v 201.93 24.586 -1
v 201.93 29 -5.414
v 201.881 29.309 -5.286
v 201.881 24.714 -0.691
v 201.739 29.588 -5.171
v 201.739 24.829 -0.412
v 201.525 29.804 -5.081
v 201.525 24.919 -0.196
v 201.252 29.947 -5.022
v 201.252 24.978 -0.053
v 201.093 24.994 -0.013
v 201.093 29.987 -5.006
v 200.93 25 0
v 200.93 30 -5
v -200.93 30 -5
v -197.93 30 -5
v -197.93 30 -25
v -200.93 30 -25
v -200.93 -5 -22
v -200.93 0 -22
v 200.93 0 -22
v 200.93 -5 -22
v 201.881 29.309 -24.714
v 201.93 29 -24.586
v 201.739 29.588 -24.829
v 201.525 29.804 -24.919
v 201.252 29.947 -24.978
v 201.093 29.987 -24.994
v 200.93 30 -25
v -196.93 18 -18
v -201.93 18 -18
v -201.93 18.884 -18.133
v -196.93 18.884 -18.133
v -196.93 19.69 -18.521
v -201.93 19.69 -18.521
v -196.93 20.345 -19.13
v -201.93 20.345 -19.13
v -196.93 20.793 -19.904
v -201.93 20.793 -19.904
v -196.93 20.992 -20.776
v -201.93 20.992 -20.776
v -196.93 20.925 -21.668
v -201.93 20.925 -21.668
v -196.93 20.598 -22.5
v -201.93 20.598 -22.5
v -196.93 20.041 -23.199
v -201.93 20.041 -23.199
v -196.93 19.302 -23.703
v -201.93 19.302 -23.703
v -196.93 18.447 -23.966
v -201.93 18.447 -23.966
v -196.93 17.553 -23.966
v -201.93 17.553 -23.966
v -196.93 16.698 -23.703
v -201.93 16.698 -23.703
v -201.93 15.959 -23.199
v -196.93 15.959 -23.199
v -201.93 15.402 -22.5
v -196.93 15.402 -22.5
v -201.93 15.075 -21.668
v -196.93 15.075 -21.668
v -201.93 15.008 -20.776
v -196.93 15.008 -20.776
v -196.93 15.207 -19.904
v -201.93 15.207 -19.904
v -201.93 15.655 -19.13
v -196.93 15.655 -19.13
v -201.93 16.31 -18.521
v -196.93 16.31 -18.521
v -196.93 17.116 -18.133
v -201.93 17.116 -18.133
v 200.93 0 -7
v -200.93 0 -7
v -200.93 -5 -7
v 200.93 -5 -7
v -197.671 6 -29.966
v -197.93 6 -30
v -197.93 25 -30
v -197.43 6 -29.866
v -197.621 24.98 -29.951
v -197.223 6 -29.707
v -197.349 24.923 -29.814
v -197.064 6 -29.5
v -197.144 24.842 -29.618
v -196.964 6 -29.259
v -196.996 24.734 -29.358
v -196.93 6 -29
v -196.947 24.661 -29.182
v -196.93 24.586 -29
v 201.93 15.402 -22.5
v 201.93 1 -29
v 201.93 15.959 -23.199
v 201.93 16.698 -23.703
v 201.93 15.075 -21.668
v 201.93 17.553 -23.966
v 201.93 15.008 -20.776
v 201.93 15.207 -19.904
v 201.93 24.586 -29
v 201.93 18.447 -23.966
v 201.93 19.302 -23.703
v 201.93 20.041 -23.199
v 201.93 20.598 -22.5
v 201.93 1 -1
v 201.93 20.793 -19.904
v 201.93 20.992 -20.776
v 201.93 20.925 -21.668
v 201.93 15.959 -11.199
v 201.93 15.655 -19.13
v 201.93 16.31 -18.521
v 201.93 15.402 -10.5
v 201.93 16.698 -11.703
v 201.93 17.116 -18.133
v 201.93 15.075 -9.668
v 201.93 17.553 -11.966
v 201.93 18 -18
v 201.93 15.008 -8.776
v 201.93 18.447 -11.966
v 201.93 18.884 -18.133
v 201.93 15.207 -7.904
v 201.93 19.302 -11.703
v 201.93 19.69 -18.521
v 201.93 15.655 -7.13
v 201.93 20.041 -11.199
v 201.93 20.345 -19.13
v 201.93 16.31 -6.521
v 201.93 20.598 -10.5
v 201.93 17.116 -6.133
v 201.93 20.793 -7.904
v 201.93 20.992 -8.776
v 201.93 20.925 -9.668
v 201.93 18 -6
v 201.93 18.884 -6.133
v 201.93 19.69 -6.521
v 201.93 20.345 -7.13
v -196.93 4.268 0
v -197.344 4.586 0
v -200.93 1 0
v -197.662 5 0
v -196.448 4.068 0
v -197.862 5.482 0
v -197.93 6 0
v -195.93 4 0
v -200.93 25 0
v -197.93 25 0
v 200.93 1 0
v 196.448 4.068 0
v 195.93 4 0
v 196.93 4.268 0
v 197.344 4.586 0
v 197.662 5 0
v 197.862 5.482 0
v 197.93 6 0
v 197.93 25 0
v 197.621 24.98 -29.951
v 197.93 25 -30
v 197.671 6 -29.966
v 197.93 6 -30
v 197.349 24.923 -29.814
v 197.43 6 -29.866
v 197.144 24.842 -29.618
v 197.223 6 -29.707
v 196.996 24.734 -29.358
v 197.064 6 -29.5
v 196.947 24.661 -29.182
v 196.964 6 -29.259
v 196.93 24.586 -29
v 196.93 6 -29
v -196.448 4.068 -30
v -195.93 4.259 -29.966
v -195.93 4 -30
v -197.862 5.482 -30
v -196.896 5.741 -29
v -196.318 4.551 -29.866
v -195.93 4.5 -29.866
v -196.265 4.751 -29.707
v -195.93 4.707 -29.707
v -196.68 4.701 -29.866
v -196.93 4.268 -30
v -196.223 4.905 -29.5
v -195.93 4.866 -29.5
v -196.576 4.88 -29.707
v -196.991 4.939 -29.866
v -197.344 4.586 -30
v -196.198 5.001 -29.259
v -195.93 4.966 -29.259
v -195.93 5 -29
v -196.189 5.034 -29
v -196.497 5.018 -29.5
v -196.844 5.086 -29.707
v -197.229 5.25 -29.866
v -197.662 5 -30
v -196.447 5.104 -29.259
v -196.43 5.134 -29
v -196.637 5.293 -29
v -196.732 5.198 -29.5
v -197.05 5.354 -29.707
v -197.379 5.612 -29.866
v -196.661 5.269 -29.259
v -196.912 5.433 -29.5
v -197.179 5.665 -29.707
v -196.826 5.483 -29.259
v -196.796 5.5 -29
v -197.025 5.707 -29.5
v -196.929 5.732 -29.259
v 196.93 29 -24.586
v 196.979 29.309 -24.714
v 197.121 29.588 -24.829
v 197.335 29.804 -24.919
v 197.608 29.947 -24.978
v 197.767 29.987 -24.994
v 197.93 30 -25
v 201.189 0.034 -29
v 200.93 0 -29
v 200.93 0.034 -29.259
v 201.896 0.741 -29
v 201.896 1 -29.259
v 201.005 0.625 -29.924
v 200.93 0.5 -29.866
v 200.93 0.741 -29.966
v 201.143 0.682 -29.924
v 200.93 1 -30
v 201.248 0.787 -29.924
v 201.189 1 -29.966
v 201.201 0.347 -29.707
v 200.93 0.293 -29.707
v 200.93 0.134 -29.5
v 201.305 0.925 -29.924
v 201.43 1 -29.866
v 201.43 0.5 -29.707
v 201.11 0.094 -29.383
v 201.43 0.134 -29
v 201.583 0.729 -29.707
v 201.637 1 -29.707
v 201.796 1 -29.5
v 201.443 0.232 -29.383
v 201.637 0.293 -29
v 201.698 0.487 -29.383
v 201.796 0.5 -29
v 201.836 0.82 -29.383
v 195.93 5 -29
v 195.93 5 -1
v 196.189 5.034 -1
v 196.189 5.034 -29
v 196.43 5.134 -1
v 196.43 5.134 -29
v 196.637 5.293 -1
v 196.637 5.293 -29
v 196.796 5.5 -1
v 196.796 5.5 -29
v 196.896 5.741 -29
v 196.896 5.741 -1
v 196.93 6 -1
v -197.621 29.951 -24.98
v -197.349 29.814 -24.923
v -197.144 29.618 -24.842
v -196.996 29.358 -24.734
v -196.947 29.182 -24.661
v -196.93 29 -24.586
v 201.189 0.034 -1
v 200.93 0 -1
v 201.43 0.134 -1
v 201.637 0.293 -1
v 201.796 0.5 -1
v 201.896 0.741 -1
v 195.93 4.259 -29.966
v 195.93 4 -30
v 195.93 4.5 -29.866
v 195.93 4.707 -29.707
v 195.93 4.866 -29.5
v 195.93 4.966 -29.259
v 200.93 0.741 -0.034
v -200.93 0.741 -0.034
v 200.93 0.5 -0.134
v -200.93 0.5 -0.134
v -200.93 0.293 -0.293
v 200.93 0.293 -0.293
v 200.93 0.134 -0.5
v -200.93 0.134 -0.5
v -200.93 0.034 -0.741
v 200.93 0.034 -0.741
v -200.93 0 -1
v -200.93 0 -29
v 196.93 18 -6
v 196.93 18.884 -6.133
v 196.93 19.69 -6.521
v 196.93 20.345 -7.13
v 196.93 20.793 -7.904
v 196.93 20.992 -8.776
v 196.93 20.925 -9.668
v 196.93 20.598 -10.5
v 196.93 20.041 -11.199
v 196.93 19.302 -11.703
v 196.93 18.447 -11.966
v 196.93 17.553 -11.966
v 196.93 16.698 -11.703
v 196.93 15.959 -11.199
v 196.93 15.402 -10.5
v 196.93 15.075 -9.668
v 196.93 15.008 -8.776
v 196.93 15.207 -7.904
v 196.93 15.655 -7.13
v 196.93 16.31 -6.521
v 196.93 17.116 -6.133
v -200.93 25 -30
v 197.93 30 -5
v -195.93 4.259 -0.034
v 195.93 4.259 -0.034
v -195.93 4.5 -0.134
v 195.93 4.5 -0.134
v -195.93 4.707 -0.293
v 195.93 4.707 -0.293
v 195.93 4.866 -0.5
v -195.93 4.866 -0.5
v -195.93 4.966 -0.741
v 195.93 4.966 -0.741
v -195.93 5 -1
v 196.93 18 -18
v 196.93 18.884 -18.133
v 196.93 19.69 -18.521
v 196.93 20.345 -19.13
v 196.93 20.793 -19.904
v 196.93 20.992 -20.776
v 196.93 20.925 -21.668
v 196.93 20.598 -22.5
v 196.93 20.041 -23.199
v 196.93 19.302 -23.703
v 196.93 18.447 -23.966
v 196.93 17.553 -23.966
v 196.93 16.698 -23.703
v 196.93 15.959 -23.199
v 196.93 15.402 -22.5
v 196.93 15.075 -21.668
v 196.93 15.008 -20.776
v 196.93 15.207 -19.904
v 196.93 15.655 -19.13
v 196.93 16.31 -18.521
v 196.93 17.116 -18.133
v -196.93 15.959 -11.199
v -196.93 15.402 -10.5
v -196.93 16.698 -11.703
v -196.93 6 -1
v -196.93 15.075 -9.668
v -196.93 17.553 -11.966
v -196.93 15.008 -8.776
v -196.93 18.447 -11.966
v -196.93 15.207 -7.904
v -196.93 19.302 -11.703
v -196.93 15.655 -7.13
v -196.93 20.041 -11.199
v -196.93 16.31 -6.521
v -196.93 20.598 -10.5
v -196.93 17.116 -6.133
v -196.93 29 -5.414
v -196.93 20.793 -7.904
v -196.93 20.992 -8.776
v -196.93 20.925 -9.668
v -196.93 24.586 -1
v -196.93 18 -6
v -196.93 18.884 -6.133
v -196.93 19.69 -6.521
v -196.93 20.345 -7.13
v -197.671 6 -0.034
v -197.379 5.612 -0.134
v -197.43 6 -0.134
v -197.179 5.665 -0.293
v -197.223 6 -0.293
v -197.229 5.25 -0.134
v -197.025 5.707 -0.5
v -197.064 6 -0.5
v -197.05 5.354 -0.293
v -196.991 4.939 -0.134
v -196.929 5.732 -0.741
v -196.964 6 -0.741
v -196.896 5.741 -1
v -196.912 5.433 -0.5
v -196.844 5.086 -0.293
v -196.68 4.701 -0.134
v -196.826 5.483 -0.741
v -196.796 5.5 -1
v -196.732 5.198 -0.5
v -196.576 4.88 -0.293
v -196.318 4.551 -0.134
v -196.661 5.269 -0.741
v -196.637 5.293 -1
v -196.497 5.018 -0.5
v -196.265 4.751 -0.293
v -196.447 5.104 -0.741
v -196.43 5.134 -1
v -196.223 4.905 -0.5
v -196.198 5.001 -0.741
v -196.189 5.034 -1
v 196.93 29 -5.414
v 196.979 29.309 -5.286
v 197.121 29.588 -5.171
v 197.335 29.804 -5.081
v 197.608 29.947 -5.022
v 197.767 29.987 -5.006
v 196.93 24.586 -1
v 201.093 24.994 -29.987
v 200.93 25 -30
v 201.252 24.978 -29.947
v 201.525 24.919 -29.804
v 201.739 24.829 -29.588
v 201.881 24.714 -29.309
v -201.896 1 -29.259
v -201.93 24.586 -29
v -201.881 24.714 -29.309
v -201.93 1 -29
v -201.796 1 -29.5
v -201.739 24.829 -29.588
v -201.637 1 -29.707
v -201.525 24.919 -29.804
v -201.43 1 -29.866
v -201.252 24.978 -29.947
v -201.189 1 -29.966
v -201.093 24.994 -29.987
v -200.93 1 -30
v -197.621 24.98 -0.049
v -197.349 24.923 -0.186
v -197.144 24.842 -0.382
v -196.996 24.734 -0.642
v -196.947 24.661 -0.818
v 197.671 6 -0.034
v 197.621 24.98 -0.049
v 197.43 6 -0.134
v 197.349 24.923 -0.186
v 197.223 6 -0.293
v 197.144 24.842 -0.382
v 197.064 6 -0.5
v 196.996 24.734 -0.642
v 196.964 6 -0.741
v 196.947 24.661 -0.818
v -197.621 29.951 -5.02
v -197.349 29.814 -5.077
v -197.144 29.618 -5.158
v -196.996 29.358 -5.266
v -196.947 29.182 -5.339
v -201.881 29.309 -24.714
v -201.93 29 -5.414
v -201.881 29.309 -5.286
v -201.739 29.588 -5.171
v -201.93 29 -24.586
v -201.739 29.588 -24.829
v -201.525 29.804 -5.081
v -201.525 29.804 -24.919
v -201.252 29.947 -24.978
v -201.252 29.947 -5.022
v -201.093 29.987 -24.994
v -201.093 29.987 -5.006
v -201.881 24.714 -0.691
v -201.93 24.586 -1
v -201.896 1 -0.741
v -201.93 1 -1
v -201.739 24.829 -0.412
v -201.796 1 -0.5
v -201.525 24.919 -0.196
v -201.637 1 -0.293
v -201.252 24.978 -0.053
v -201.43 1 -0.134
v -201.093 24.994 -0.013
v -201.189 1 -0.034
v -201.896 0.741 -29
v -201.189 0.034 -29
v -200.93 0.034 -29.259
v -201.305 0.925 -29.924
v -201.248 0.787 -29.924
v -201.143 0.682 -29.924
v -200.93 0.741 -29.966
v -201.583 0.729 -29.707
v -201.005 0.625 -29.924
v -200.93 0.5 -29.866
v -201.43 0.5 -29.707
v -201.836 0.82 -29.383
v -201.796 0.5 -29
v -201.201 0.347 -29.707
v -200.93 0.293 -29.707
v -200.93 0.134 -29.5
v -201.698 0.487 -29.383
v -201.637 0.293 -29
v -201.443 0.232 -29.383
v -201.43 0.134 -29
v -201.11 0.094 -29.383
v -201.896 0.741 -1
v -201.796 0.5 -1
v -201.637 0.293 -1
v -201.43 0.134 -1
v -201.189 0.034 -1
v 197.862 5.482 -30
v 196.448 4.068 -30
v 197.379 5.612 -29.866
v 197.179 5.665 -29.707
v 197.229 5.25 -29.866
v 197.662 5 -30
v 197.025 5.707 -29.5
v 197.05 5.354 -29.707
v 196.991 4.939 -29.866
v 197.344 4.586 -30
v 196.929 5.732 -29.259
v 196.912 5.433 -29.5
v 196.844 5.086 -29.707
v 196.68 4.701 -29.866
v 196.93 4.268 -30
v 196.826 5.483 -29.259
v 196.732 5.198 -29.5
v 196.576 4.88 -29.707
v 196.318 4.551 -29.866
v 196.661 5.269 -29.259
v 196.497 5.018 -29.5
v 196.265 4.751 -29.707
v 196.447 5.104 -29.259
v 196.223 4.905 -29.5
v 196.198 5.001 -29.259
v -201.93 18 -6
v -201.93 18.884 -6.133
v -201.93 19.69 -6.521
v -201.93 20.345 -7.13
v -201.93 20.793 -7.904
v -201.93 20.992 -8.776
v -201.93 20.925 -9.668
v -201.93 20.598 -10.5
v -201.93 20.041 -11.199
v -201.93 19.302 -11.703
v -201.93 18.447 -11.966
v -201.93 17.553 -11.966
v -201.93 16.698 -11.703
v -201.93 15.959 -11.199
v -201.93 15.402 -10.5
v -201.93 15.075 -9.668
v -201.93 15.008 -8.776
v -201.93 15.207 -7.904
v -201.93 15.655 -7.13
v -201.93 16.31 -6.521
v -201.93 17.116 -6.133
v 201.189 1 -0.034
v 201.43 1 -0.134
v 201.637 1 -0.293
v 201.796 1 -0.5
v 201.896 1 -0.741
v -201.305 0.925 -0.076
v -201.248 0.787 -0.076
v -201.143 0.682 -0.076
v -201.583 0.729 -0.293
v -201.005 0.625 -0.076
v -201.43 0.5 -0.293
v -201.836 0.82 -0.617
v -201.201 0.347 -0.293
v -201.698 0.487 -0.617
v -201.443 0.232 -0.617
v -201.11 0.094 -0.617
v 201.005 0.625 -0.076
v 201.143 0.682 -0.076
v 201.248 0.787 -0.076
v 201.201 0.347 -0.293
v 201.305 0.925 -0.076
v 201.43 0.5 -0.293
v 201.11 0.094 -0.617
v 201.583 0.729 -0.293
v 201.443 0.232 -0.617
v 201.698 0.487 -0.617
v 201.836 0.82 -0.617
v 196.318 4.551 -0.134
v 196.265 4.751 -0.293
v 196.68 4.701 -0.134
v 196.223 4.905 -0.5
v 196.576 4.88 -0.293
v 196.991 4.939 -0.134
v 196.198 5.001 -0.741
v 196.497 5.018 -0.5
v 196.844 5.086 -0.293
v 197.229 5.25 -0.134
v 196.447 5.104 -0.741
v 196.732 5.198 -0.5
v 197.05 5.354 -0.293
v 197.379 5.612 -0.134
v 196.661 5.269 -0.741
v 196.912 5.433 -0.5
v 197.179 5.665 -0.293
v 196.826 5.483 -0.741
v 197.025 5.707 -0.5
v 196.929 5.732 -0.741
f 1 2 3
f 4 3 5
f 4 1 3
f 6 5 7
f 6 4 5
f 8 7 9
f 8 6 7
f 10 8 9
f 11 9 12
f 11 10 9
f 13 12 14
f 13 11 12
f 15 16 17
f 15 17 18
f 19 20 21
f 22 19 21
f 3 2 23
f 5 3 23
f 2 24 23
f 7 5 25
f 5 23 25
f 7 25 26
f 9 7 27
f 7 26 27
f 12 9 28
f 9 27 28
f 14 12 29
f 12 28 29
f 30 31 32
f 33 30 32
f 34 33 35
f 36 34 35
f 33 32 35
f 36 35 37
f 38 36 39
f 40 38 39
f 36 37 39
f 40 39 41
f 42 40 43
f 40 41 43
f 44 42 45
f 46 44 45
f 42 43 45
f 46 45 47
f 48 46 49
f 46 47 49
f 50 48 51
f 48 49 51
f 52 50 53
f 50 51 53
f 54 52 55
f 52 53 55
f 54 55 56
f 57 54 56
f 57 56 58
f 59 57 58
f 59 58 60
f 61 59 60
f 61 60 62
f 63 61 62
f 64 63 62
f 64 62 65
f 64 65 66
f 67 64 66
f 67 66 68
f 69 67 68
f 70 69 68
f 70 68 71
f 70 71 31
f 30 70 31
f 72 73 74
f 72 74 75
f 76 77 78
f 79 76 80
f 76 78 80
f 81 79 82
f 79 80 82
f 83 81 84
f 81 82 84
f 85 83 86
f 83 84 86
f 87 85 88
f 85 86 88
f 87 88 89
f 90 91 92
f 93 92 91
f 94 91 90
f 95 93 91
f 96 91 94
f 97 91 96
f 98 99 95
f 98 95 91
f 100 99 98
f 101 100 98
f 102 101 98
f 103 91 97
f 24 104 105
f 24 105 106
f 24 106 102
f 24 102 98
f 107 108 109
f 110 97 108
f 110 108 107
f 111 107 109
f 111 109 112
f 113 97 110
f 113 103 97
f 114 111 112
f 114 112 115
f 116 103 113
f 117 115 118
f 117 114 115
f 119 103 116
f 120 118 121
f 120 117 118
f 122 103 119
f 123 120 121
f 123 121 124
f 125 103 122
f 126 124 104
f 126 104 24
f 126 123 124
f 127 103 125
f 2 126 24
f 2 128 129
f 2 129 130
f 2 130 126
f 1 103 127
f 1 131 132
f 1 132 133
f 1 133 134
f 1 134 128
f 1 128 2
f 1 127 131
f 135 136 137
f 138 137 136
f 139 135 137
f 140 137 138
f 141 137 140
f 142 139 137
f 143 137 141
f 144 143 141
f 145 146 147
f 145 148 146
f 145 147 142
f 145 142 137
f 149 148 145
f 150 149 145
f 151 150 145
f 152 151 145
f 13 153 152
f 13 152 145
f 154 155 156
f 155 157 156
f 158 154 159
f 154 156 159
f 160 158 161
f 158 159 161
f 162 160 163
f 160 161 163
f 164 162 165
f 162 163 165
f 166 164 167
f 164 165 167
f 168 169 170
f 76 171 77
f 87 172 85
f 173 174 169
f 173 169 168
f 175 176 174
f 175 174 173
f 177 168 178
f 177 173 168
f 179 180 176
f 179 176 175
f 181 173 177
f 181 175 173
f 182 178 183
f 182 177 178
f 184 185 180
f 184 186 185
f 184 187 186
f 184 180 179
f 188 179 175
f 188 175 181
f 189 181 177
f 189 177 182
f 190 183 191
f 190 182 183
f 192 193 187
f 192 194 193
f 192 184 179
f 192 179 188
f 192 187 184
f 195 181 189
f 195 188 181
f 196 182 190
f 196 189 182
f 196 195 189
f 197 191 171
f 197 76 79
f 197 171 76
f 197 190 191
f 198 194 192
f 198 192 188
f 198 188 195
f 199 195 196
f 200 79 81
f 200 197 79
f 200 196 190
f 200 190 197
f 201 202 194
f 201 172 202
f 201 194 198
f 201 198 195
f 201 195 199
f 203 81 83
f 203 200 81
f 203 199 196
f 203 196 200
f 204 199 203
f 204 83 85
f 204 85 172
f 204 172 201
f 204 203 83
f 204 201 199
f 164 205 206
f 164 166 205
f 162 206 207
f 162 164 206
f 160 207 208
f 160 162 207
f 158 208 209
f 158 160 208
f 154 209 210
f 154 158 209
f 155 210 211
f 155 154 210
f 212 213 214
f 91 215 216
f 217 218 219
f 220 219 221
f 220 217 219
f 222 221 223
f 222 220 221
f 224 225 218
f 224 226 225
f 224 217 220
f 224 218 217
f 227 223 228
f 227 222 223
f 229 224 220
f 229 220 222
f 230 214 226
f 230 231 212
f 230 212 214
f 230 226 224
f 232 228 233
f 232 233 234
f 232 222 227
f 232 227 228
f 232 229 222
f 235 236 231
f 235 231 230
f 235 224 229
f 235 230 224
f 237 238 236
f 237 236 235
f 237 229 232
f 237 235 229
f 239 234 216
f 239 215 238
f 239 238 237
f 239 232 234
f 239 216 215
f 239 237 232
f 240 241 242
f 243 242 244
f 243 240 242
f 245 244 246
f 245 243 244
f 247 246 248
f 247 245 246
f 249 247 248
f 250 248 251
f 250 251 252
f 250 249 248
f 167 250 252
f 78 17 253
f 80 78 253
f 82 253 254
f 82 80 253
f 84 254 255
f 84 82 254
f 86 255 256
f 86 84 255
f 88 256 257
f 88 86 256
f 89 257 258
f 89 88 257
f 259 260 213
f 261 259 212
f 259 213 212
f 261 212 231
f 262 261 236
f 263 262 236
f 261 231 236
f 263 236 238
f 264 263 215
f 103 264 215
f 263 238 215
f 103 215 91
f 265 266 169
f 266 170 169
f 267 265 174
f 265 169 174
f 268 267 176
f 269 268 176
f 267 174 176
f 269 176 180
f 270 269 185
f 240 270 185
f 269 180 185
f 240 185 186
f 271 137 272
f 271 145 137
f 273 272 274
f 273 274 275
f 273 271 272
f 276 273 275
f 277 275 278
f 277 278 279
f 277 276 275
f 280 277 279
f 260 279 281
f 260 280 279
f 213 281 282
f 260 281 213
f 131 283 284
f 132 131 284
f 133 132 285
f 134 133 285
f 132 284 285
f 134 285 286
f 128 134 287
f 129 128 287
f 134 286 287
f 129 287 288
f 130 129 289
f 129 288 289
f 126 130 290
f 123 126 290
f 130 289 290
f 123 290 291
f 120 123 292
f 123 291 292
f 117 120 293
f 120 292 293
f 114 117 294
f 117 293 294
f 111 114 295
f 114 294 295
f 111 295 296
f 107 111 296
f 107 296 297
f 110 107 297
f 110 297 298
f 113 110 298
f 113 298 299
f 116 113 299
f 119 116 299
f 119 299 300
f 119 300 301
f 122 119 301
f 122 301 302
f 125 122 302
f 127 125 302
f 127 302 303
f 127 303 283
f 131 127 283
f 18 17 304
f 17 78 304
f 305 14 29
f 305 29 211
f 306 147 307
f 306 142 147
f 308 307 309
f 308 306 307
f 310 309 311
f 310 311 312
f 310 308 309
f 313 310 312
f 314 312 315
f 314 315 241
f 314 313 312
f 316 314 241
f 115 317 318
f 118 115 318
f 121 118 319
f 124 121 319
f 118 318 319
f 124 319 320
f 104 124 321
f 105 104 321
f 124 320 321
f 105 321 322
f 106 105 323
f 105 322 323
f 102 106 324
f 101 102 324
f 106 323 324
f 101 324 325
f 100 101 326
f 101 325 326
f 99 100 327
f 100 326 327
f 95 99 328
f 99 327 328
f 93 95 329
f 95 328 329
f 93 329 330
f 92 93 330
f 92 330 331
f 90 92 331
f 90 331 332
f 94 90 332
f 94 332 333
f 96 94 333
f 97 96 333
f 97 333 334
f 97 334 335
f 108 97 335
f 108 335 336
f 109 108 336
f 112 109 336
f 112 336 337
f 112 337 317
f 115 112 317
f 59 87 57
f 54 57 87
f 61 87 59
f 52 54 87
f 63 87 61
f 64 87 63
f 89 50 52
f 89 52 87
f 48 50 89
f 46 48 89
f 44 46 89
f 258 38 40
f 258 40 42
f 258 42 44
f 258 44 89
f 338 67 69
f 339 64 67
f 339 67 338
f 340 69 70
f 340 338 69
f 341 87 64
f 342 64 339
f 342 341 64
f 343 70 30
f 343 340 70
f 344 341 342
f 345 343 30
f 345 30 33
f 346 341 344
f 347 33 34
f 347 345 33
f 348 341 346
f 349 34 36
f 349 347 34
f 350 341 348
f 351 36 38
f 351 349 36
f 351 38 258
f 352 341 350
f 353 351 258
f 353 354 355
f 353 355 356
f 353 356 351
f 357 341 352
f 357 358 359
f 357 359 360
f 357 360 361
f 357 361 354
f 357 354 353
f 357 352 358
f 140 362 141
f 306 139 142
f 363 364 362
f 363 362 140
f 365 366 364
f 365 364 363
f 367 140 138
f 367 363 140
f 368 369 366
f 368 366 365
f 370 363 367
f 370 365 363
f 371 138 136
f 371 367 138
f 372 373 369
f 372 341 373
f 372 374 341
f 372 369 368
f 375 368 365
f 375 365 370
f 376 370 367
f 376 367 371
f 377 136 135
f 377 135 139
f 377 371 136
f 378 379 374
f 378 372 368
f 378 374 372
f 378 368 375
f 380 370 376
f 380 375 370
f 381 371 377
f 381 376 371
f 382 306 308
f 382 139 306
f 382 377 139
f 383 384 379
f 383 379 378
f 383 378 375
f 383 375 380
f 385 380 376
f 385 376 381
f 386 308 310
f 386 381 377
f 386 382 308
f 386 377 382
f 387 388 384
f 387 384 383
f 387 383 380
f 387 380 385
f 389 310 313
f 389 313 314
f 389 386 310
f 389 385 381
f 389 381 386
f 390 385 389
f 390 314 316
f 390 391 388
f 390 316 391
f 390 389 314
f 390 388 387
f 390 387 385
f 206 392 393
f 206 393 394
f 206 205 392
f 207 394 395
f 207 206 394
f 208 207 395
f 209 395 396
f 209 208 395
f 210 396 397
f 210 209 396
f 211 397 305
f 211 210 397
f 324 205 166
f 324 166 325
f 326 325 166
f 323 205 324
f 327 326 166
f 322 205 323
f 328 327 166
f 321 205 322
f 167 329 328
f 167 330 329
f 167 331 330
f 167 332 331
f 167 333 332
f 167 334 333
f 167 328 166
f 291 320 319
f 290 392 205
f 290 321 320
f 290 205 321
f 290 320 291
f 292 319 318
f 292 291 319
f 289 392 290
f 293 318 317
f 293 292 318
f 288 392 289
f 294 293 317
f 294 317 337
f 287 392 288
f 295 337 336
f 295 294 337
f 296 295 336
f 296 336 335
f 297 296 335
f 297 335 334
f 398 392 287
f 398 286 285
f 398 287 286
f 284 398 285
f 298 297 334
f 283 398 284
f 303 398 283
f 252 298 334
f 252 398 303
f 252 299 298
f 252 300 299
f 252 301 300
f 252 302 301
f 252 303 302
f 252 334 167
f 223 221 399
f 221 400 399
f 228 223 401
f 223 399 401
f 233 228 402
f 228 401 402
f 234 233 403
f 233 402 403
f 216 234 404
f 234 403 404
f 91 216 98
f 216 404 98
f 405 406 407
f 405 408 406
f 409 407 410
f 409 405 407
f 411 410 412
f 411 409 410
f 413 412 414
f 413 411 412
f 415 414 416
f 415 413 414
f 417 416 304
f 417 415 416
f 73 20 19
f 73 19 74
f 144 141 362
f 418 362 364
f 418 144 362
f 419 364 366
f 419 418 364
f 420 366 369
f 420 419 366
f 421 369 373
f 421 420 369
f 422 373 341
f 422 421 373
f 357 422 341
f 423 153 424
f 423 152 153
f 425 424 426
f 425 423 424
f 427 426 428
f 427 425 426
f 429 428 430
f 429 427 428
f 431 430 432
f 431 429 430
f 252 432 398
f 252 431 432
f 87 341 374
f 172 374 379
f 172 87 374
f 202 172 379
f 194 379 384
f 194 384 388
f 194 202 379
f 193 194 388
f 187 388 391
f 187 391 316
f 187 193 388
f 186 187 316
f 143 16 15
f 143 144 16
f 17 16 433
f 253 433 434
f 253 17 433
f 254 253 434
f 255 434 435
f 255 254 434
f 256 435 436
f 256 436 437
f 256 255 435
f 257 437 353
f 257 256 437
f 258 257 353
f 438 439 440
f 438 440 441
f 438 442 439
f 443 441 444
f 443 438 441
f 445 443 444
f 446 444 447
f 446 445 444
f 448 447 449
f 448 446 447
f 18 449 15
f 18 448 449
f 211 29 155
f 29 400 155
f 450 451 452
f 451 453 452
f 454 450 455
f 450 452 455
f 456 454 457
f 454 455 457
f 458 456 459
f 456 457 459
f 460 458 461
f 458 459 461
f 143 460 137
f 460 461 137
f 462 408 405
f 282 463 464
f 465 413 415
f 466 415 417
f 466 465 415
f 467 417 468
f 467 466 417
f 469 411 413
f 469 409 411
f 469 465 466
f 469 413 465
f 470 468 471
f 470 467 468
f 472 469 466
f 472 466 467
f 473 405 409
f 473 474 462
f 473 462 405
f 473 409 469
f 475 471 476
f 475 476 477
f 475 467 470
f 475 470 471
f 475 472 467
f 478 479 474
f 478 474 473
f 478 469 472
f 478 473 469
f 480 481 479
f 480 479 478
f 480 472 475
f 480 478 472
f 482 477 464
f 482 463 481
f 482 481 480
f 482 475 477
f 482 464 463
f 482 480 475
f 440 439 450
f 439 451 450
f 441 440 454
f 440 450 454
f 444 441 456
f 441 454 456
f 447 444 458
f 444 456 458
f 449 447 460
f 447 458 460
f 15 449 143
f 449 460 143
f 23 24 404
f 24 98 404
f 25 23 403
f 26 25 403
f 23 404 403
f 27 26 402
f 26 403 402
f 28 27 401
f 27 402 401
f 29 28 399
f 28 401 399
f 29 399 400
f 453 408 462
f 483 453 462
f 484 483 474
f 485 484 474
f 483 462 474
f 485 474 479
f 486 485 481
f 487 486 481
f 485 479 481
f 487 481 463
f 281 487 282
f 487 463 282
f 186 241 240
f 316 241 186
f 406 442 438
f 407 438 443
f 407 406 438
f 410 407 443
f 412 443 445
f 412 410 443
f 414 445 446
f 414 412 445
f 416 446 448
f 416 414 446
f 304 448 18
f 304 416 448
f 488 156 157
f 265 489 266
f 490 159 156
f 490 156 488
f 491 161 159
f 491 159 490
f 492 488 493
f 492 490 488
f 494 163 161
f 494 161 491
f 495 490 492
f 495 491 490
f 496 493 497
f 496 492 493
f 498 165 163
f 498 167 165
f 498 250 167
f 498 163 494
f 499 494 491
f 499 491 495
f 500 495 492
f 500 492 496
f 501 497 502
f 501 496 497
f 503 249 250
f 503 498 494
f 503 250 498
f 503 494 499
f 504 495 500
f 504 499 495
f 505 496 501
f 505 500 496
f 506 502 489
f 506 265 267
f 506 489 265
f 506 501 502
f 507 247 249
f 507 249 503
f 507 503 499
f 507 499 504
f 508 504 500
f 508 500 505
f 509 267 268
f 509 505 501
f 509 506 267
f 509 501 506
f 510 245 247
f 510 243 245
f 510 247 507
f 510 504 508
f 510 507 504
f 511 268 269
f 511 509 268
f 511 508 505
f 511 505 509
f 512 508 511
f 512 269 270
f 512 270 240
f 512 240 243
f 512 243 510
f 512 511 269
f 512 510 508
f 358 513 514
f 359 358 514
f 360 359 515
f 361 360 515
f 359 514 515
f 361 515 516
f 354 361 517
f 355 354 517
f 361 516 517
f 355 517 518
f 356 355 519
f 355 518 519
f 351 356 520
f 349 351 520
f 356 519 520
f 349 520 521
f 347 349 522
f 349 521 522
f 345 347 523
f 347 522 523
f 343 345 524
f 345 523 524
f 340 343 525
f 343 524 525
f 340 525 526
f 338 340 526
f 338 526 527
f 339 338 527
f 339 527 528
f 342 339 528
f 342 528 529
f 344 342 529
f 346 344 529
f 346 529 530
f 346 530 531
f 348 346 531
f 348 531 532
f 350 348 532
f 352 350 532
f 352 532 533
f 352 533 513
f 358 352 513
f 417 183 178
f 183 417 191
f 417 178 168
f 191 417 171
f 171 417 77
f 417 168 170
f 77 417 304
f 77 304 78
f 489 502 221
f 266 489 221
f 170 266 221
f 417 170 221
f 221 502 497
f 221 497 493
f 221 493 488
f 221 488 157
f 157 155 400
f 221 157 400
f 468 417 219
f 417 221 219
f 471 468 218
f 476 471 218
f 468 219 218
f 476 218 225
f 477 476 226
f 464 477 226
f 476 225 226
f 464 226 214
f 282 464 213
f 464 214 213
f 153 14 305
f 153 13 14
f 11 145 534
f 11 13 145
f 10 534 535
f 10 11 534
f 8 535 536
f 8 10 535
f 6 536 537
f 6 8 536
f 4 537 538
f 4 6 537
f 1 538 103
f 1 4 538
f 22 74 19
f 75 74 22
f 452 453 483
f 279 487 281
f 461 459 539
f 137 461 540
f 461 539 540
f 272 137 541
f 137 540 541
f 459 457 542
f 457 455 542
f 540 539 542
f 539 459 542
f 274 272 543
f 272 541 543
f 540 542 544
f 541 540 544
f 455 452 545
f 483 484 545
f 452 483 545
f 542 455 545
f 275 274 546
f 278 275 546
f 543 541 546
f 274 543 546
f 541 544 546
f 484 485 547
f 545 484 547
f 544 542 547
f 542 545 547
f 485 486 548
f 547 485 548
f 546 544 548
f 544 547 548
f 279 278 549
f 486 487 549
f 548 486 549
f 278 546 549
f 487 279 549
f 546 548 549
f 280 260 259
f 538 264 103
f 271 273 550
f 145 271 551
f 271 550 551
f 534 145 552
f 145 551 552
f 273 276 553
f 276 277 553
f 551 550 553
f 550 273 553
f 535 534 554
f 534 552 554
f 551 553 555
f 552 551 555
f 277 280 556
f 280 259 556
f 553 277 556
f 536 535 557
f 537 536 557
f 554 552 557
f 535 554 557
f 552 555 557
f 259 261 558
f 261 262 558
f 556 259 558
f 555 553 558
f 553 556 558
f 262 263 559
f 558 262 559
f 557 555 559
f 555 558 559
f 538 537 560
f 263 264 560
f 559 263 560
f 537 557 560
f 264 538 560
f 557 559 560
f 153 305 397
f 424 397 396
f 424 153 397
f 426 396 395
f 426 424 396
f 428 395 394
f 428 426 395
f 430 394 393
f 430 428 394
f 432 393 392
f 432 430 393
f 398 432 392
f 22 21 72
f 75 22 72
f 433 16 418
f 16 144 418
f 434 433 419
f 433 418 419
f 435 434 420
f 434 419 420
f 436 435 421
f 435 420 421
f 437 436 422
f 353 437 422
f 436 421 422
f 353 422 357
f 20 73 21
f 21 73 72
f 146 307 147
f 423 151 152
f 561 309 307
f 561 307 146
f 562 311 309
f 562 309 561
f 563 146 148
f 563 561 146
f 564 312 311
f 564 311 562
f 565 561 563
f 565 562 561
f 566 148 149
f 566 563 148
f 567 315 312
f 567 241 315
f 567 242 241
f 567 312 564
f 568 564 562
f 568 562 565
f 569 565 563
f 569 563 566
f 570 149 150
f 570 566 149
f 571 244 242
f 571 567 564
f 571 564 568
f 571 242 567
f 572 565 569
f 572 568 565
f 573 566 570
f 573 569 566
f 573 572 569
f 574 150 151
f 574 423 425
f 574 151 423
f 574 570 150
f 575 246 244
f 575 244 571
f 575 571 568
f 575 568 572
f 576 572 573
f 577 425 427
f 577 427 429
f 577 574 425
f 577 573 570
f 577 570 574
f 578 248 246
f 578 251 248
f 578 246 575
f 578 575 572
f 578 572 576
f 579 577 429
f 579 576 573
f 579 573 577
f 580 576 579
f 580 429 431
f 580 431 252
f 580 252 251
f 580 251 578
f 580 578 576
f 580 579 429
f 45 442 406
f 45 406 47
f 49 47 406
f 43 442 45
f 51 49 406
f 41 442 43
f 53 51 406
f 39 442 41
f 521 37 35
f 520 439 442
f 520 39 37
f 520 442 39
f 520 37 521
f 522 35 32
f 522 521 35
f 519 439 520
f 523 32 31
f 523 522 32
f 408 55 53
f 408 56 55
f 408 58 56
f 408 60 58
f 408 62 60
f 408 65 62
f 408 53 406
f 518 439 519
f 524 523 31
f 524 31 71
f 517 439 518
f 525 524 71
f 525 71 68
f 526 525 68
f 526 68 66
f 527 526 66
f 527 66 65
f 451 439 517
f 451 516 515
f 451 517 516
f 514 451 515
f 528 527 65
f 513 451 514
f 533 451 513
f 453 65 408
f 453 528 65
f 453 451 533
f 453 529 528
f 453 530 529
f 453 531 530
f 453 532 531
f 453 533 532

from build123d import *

# Parameters (mm, degrees)
EXTRUDE_THIN1_DEPTH   = 30
CHAMFER1_SIZE         = 5
FILLET1_R             = 1
F_6_0MM_DOWEL_SLOT1_D = 6
SKETCH6_W             = 401.86
SKETCH6_H             = 15
BOSS_EXTRUDE1_DEPTH   = 5


with BuildPart() as part:
    # Sketch1 → Extrude-Thin1 (new body)
    with BuildSketch(Plane.XY):
        Polygon((-201.93, 30), (-201.93, 0), (201.93, 0), (201.93, 30), (196.93, 30), (196.93, 5), (-196.93, 5), (-196.93, 30), align=None)
    extrude(amount=-EXTRUDE_THIN1_DEPTH)

    # Chamfer1
    chamfer1_edges = [part.edges().sort_by_distance(p)[0] for p in [
        (-199.43, 30, -30),
        (-199.43, 30, 0),
        (199.43, 30, -30),
        (199.43, 30, 0),
    ]]
    chamfer(chamfer1_edges, length=CHAMFER1_SIZE)

    # Fillet1
    fillet1_edges = [part.edges().sort_by_distance(p)[0] for p in [
        (201.93, 0, -15),
        (-201.93, 0, -15),
        (-196.93, 5, -15),
        (196.93, 5, -15),
        (196.93, 15, -30),
        (0, 5, -30),
        (-201.93, 12.5, -30),
        (-196.93, 15, -30),
        (201.93, 30, -15),
        (201.93, 27.5, -2.5),
        (201.93, 27.5, -27.5),
        (196.93, 30, -15),
        (196.93, 27.5, -2.5),
        (196.93, 27.5, -27.5),
        (-196.93, 15, 0),
        (-201.93, 12.5, 0),
        (0, 0, -30),
        (-196.93, 30, -15),
        (-196.93, 27.5, -2.5),
        (-196.93, 27.5, -27.5),
        (-201.93, 30, -15),
        (-201.93, 27.5, -2.5),
        (-201.93, 27.5, -27.5),
        (201.93, 12.5, -30),
        (0, 0, 0),
        (0, 5, 0),
        (196.93, 15, 0),
        (201.93, 12.5, 0),
    ]]
    fillet(fillet1_edges, radius=FILLET1_R)

    # Ø6.0mm Dowel Slot1 (through all)
    with Locations(Plane(origin=(201.93, 0, 0), x_dir=(0, 0, -1), z_dir=(1, 0, 0))):
        with Locations((21, 18), (9, 18)):
            Hole(F_6_0MM_DOWEL_SLOT1_D / 2)


with BuildPart() as body_2:
    # Sketch6 → Boss-Extrude1 (new body)
    with BuildSketch(Plane.XZ):
        with Locations((0, -14.5)):
            Rectangle(SKETCH6_W, SKETCH6_H)
    extrude(amount=BOSS_EXTRUDE1_DEPTH)


solid = Compound([part.part, body_2.part])
